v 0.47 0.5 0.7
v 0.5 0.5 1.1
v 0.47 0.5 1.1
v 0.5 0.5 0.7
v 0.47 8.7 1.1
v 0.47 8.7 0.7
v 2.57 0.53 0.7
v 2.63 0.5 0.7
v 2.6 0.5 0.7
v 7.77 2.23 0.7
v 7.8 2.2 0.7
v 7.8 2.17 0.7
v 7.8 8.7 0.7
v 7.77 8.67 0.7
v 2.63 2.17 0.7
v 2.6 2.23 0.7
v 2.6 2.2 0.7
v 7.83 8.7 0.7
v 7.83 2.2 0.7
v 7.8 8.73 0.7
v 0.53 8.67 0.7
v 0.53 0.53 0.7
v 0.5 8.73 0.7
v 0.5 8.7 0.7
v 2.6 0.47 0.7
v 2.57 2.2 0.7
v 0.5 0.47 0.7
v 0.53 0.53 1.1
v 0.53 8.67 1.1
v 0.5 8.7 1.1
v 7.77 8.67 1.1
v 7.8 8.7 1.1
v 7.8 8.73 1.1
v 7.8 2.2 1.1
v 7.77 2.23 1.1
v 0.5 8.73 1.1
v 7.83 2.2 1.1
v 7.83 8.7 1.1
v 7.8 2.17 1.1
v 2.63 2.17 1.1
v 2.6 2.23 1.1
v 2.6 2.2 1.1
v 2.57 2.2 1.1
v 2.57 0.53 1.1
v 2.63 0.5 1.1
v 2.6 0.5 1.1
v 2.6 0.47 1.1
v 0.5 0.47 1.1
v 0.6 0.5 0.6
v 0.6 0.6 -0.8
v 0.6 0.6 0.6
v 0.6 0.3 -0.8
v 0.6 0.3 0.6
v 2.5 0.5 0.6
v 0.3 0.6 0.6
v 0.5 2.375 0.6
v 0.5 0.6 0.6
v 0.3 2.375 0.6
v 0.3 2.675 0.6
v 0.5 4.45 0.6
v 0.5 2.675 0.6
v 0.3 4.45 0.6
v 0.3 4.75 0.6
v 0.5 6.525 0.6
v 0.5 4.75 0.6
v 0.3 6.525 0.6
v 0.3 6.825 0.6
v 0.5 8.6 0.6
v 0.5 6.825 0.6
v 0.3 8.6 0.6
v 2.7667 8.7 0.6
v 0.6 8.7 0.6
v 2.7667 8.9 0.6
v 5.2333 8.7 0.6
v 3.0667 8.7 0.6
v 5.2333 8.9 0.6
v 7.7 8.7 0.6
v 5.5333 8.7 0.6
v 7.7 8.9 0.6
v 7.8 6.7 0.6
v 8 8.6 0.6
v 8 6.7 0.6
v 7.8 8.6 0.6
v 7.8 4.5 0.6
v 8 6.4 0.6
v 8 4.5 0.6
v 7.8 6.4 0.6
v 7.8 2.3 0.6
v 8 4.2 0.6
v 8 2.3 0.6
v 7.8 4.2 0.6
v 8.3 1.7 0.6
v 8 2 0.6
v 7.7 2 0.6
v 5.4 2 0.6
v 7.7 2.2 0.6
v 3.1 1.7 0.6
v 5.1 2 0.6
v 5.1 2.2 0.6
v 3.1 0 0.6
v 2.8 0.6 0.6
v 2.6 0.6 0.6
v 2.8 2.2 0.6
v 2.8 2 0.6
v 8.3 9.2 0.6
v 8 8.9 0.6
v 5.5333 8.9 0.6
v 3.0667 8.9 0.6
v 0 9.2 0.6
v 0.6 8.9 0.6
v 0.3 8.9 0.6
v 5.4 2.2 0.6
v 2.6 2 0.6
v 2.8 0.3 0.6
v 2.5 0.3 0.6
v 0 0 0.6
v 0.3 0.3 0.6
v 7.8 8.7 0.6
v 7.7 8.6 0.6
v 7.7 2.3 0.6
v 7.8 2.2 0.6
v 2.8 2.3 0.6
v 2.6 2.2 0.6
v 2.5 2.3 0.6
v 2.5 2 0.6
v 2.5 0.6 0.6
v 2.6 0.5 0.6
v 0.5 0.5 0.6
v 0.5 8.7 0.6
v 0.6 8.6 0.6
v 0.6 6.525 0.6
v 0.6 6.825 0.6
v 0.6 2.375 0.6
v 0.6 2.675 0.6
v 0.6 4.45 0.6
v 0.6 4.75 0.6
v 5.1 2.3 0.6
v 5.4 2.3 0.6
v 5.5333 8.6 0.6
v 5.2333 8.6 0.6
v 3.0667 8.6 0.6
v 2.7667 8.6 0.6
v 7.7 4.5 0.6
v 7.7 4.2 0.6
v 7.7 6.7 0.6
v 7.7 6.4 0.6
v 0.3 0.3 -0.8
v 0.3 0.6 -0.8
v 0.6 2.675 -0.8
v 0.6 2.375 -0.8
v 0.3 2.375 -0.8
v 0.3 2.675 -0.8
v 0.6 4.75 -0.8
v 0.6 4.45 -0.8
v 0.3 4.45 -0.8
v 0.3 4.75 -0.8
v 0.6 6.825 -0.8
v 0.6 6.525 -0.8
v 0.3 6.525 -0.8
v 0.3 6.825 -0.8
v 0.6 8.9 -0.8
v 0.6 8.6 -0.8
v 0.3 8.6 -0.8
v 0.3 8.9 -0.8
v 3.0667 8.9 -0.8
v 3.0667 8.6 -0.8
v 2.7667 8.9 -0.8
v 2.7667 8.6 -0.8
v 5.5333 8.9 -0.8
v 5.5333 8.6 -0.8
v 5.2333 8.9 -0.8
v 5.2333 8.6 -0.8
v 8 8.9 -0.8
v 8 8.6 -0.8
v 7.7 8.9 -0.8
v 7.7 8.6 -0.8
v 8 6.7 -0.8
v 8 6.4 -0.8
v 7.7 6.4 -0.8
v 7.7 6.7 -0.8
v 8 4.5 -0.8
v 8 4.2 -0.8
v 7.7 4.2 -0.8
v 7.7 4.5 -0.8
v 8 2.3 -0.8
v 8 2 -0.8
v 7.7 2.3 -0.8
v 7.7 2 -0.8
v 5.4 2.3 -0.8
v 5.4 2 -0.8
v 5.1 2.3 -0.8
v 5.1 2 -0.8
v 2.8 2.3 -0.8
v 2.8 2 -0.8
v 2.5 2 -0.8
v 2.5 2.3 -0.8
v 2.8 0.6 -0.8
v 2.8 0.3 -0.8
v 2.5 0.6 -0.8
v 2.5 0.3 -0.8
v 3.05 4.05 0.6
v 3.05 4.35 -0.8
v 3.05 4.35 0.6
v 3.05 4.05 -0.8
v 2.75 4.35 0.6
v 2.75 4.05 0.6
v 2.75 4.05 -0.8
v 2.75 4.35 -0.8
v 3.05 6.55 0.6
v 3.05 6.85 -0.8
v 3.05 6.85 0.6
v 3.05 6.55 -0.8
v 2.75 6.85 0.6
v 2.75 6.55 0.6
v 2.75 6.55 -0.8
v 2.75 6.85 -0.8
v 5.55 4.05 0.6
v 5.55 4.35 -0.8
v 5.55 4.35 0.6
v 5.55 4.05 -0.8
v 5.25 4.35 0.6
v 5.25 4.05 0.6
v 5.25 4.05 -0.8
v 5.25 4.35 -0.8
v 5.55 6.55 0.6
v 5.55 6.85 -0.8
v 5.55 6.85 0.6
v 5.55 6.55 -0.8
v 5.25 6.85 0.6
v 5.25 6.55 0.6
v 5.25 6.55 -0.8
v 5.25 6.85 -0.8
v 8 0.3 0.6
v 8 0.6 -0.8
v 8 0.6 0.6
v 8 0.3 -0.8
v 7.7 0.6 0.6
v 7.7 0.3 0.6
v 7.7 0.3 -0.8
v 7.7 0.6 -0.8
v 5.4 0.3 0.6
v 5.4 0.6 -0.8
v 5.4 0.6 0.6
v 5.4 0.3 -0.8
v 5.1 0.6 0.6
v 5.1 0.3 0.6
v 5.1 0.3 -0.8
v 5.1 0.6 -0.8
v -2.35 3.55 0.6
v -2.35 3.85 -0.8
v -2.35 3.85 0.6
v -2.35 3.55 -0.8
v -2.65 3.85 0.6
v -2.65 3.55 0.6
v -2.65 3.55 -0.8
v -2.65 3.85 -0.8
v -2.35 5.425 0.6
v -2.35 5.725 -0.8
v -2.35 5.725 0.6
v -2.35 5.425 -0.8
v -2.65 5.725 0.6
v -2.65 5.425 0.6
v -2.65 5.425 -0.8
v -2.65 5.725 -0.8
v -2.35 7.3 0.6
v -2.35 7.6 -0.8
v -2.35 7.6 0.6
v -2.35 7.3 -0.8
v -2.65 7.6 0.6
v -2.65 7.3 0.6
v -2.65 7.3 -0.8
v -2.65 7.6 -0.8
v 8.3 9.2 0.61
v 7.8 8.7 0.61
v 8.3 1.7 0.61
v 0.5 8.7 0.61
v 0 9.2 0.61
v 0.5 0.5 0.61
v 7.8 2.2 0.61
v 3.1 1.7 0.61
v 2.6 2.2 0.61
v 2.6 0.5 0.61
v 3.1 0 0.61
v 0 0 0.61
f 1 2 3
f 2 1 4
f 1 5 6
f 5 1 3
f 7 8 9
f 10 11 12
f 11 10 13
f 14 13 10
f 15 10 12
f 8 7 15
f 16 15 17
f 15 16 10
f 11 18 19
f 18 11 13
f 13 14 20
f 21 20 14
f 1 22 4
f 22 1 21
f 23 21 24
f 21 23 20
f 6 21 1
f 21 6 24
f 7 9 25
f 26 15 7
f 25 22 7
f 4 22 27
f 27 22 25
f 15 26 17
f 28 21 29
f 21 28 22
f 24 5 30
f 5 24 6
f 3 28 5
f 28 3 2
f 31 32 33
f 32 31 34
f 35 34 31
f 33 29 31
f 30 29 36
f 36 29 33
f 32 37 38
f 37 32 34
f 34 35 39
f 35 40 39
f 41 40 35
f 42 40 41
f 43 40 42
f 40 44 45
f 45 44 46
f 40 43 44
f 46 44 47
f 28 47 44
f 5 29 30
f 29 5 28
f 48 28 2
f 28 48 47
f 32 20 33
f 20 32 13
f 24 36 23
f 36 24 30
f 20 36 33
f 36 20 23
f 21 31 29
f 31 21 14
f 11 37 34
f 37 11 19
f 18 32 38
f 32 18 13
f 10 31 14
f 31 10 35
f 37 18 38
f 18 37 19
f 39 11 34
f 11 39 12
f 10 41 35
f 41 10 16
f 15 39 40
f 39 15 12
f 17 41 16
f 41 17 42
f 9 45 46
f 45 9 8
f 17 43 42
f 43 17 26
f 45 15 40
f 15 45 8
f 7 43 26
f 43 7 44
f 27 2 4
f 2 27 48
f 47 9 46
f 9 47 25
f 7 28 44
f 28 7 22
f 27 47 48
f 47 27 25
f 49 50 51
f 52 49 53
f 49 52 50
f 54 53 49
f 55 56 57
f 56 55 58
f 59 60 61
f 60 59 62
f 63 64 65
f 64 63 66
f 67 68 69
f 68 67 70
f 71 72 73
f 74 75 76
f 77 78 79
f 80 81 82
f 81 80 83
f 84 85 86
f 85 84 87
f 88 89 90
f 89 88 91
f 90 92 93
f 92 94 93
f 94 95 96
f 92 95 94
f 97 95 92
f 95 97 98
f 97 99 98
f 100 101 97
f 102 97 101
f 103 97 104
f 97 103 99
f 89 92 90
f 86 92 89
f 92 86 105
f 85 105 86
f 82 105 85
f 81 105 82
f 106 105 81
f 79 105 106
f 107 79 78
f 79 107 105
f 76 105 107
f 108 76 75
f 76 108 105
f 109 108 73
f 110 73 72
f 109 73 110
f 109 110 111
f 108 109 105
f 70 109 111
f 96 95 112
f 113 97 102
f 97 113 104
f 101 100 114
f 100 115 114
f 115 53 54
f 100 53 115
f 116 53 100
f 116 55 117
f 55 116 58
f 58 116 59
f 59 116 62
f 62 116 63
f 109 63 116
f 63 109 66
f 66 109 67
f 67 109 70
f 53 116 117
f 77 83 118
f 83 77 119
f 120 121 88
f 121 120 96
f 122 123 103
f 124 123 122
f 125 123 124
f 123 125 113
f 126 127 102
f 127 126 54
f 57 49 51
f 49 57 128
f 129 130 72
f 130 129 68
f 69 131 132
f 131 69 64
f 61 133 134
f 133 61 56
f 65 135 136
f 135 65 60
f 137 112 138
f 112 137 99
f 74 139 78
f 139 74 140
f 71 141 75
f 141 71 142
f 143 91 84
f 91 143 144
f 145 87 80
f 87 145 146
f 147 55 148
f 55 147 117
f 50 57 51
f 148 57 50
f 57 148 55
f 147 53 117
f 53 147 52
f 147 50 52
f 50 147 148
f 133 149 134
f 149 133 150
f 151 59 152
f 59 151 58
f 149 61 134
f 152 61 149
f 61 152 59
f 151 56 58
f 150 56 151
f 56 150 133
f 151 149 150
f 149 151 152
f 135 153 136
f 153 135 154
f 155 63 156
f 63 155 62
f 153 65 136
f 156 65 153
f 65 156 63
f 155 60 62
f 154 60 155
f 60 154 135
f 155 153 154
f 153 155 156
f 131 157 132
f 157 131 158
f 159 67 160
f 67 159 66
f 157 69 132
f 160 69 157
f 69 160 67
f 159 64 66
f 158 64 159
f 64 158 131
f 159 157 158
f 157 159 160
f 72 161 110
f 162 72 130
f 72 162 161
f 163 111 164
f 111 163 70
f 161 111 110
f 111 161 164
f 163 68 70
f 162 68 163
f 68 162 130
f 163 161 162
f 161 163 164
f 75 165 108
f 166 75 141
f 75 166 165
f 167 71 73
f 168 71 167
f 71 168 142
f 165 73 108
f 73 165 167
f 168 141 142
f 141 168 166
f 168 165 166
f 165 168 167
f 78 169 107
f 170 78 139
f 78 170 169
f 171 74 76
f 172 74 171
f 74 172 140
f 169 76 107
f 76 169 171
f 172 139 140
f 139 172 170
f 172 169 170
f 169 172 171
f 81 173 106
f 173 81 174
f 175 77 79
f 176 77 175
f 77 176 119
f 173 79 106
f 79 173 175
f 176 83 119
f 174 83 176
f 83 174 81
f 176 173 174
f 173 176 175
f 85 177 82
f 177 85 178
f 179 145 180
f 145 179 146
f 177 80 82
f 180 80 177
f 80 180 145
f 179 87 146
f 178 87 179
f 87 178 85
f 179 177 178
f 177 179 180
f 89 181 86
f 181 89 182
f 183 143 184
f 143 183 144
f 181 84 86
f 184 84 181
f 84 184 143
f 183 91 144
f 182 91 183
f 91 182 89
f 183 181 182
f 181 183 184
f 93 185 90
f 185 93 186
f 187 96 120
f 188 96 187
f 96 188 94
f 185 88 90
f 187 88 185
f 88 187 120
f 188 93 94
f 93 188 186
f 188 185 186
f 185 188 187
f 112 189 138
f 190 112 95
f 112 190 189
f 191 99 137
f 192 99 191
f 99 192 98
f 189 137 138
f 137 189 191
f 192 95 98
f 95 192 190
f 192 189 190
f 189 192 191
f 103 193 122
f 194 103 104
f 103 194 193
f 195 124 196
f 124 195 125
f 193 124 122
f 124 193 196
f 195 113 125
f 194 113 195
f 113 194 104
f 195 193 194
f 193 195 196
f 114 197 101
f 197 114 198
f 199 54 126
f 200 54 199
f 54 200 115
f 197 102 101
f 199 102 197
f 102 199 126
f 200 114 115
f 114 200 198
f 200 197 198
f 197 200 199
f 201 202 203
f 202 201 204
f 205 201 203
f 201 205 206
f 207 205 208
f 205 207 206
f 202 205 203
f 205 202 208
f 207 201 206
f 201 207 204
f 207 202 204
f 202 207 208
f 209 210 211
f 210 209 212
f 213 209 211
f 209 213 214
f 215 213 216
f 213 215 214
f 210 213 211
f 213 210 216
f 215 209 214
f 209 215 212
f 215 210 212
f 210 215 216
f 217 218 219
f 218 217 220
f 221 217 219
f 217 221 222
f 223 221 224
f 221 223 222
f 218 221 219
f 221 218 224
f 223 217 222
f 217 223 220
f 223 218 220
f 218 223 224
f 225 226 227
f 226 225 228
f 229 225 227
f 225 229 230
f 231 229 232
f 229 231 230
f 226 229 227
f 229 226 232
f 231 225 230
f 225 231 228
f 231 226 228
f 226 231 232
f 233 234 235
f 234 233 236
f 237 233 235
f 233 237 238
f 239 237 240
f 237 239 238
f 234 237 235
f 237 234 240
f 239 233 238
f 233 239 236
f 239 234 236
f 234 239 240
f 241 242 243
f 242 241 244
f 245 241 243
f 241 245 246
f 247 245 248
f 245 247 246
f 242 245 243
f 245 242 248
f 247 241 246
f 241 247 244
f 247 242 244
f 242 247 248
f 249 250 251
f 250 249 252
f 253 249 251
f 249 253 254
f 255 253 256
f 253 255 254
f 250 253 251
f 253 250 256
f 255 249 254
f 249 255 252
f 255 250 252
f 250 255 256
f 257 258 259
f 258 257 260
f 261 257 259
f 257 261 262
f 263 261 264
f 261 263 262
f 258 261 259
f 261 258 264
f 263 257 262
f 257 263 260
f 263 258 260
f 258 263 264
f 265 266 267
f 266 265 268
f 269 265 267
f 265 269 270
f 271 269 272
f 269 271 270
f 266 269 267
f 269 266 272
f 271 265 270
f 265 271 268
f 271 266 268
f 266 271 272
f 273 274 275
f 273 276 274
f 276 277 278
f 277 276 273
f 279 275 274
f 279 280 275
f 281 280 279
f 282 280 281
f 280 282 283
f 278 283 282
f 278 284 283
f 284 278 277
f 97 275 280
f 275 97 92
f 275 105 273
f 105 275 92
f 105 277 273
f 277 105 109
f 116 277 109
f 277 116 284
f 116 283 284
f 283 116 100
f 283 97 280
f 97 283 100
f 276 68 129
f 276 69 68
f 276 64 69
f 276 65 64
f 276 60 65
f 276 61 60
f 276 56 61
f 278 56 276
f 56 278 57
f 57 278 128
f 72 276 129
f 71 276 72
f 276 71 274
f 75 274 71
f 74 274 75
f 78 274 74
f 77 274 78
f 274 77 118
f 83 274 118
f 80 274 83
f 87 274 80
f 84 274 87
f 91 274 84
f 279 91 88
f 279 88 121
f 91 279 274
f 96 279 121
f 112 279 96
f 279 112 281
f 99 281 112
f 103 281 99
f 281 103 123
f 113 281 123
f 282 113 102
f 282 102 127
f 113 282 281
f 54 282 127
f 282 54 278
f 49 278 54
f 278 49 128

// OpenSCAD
flat = false;

pw = 0.3; // plinth width
ph = 0.6; // plinth height
pd = 0.8; // plinth depth

p2 = -0.05;

n = [0, p2];
ne = [p2, p2];
e = [p2, 0];
se = [p2, -p2];
s = [0, -p2];
sw = [-p2, -p2];
w = [-p2, 0];
nw = [-p2, p2];

module plinth(x, y) {
    echo("plinth position: ", [x, y])
    // above ground
    if (flat) {
        translate([x, y])
        square([pw, pw], center = true);
    } else {
        color("gray")
        translate([x, y, ph/2])
        cube([pw, pw, ph], center = true);
    }
        
    // below ground
    if (flat) {
        translate([x, y])
        square([pw, pw], center = true);
    } else {
        color("azure", 0.80)
        translate([x, y, -pd/2])
        cube([pw, pw, pd], center = true);
    }
}

// Corners
wt = 0.5;
c1 = [0 + wt, 0 + wt];
c2 = [0 + wt, 9.2 - wt];
c3 = [8.3 - wt, 9.2 - wt];
c4 = [8.3 - wt, 1.7 + wt];
c5 = [3.1 - wt, 1.7 + wt];
c6 = [3.1 - wt, 0 + wt];
oc1 = [0, 0];
oc2 = [0, 9.2];
oc3 = [8.3, 9.2];
oc4 = [8.3, 1.7];
oc5 = [3.1, 1.7];
oc6 = [3.1, 0];


// Outer surface area
if (flat) {
    difference() {
        polygon([oc1, oc2, oc3, oc4, oc5, oc6]);
        polygon([c1, c2, c3, c4, c5, c6]);
    }
} else {
    translate([0, 0, ph])
    linear_extrude(0.01)
    difference() {
        polygon([oc1, oc2, oc3, oc4, oc5, oc6]);
        polygon([c1, c2, c3, c4, c5, c6]);
    }
}

// Create a line of plinths
module plinth_line(coord1, coord2, nbr, tag = "cc") {
    assert(nbr >= 2, "more than two plinths");
    let ( cc = (coord2 - coord1)/(nbr - 1)
        )
        echo(tag, sqrt(cc[0]*cc[0] + cc[1]*cc[1]))
        for (i=[0:nbr - 1])
          plinth(coord1[0] + i*cc[0], coord1[1] + i*cc[1]);
}

module beam(p1, p2, width, height, color = "yellow") {
    let ( x_diff = p2[0] - p1[0]
        , y_diff = p2[1] - p1[1]
        , length = sqrt(pow(x_diff, 2) + pow(y_diff, 2))
        )
        color(color)
        translate(p1 + (p2 - p1)/2)
        rotate(atan2(y_diff, x_diff))
        cube([length, width, height], center = true);
}

module doublebeam(p1, p2, width, height) {
    beam(p1, p2, width, height);
    translate([0, 0, height]) beam(p1, p2, width, height, "gray");
}

// Outer beams

let ( th = 0.06
    , h = 0.2
    )
    translate([0, 0, 0.8]) 
    union() {
        doublebeam(c1, c2, th, h);
        doublebeam(c2, c3, th, h);
        doublebeam(c3, c4, th, h);
        doublebeam(c4, c5, th, h);
        doublebeam(c5, c6, th, h);
        doublebeam(c6, c1, th, h);
    }

if (true) {
    // Wall plinths
    plinth_line(c1 + ne, c2 + se, 5, "south wall");
    plinth_line(c2 + se, c3 + sw, 4, "west wall");
    plinth_line(c3 + sw, c4 + nw, 4, "north wall");
    plinth_line(c4 + nw, c5 + nw, 3, "east wall");
    plinth(c6[0] + nw[0], c6[1] + nw[1]);

    // Center plinths
    let ( c = (c2 + c4)/2
        , d = 2.5
        )
        for (x=[0:1], y=[0:1])
            plinth( c[0] + x*d - d/2
                  , c[1] + y*d - d/2
                  );

    // Front porch plinths
    let ( c = [(c4 + nw)[0], (c1 + ne)[1]]
        )
        plinth_line(c, c6 + nw, 3, "front porch");

    // Winter garden
    let ( l1 = 3.7
        , l2 = 3.75
        , w = 2.5
        )
        plinth_line([-w, l1], [-w, l2 + l1], 3, "winter garden");
    
    // Measurements
    let ( nbr = 21
        )
        echo("concrete m3", nbr*pw*pw*(ph + pd));
    let ( area = (c2[1] - c4[1])*(c4[0] - c1[0]) + 
                 (c5[1] - c1[1])*(c5[0] - c1[0])
        )
        echo("area m2", area);
    }
